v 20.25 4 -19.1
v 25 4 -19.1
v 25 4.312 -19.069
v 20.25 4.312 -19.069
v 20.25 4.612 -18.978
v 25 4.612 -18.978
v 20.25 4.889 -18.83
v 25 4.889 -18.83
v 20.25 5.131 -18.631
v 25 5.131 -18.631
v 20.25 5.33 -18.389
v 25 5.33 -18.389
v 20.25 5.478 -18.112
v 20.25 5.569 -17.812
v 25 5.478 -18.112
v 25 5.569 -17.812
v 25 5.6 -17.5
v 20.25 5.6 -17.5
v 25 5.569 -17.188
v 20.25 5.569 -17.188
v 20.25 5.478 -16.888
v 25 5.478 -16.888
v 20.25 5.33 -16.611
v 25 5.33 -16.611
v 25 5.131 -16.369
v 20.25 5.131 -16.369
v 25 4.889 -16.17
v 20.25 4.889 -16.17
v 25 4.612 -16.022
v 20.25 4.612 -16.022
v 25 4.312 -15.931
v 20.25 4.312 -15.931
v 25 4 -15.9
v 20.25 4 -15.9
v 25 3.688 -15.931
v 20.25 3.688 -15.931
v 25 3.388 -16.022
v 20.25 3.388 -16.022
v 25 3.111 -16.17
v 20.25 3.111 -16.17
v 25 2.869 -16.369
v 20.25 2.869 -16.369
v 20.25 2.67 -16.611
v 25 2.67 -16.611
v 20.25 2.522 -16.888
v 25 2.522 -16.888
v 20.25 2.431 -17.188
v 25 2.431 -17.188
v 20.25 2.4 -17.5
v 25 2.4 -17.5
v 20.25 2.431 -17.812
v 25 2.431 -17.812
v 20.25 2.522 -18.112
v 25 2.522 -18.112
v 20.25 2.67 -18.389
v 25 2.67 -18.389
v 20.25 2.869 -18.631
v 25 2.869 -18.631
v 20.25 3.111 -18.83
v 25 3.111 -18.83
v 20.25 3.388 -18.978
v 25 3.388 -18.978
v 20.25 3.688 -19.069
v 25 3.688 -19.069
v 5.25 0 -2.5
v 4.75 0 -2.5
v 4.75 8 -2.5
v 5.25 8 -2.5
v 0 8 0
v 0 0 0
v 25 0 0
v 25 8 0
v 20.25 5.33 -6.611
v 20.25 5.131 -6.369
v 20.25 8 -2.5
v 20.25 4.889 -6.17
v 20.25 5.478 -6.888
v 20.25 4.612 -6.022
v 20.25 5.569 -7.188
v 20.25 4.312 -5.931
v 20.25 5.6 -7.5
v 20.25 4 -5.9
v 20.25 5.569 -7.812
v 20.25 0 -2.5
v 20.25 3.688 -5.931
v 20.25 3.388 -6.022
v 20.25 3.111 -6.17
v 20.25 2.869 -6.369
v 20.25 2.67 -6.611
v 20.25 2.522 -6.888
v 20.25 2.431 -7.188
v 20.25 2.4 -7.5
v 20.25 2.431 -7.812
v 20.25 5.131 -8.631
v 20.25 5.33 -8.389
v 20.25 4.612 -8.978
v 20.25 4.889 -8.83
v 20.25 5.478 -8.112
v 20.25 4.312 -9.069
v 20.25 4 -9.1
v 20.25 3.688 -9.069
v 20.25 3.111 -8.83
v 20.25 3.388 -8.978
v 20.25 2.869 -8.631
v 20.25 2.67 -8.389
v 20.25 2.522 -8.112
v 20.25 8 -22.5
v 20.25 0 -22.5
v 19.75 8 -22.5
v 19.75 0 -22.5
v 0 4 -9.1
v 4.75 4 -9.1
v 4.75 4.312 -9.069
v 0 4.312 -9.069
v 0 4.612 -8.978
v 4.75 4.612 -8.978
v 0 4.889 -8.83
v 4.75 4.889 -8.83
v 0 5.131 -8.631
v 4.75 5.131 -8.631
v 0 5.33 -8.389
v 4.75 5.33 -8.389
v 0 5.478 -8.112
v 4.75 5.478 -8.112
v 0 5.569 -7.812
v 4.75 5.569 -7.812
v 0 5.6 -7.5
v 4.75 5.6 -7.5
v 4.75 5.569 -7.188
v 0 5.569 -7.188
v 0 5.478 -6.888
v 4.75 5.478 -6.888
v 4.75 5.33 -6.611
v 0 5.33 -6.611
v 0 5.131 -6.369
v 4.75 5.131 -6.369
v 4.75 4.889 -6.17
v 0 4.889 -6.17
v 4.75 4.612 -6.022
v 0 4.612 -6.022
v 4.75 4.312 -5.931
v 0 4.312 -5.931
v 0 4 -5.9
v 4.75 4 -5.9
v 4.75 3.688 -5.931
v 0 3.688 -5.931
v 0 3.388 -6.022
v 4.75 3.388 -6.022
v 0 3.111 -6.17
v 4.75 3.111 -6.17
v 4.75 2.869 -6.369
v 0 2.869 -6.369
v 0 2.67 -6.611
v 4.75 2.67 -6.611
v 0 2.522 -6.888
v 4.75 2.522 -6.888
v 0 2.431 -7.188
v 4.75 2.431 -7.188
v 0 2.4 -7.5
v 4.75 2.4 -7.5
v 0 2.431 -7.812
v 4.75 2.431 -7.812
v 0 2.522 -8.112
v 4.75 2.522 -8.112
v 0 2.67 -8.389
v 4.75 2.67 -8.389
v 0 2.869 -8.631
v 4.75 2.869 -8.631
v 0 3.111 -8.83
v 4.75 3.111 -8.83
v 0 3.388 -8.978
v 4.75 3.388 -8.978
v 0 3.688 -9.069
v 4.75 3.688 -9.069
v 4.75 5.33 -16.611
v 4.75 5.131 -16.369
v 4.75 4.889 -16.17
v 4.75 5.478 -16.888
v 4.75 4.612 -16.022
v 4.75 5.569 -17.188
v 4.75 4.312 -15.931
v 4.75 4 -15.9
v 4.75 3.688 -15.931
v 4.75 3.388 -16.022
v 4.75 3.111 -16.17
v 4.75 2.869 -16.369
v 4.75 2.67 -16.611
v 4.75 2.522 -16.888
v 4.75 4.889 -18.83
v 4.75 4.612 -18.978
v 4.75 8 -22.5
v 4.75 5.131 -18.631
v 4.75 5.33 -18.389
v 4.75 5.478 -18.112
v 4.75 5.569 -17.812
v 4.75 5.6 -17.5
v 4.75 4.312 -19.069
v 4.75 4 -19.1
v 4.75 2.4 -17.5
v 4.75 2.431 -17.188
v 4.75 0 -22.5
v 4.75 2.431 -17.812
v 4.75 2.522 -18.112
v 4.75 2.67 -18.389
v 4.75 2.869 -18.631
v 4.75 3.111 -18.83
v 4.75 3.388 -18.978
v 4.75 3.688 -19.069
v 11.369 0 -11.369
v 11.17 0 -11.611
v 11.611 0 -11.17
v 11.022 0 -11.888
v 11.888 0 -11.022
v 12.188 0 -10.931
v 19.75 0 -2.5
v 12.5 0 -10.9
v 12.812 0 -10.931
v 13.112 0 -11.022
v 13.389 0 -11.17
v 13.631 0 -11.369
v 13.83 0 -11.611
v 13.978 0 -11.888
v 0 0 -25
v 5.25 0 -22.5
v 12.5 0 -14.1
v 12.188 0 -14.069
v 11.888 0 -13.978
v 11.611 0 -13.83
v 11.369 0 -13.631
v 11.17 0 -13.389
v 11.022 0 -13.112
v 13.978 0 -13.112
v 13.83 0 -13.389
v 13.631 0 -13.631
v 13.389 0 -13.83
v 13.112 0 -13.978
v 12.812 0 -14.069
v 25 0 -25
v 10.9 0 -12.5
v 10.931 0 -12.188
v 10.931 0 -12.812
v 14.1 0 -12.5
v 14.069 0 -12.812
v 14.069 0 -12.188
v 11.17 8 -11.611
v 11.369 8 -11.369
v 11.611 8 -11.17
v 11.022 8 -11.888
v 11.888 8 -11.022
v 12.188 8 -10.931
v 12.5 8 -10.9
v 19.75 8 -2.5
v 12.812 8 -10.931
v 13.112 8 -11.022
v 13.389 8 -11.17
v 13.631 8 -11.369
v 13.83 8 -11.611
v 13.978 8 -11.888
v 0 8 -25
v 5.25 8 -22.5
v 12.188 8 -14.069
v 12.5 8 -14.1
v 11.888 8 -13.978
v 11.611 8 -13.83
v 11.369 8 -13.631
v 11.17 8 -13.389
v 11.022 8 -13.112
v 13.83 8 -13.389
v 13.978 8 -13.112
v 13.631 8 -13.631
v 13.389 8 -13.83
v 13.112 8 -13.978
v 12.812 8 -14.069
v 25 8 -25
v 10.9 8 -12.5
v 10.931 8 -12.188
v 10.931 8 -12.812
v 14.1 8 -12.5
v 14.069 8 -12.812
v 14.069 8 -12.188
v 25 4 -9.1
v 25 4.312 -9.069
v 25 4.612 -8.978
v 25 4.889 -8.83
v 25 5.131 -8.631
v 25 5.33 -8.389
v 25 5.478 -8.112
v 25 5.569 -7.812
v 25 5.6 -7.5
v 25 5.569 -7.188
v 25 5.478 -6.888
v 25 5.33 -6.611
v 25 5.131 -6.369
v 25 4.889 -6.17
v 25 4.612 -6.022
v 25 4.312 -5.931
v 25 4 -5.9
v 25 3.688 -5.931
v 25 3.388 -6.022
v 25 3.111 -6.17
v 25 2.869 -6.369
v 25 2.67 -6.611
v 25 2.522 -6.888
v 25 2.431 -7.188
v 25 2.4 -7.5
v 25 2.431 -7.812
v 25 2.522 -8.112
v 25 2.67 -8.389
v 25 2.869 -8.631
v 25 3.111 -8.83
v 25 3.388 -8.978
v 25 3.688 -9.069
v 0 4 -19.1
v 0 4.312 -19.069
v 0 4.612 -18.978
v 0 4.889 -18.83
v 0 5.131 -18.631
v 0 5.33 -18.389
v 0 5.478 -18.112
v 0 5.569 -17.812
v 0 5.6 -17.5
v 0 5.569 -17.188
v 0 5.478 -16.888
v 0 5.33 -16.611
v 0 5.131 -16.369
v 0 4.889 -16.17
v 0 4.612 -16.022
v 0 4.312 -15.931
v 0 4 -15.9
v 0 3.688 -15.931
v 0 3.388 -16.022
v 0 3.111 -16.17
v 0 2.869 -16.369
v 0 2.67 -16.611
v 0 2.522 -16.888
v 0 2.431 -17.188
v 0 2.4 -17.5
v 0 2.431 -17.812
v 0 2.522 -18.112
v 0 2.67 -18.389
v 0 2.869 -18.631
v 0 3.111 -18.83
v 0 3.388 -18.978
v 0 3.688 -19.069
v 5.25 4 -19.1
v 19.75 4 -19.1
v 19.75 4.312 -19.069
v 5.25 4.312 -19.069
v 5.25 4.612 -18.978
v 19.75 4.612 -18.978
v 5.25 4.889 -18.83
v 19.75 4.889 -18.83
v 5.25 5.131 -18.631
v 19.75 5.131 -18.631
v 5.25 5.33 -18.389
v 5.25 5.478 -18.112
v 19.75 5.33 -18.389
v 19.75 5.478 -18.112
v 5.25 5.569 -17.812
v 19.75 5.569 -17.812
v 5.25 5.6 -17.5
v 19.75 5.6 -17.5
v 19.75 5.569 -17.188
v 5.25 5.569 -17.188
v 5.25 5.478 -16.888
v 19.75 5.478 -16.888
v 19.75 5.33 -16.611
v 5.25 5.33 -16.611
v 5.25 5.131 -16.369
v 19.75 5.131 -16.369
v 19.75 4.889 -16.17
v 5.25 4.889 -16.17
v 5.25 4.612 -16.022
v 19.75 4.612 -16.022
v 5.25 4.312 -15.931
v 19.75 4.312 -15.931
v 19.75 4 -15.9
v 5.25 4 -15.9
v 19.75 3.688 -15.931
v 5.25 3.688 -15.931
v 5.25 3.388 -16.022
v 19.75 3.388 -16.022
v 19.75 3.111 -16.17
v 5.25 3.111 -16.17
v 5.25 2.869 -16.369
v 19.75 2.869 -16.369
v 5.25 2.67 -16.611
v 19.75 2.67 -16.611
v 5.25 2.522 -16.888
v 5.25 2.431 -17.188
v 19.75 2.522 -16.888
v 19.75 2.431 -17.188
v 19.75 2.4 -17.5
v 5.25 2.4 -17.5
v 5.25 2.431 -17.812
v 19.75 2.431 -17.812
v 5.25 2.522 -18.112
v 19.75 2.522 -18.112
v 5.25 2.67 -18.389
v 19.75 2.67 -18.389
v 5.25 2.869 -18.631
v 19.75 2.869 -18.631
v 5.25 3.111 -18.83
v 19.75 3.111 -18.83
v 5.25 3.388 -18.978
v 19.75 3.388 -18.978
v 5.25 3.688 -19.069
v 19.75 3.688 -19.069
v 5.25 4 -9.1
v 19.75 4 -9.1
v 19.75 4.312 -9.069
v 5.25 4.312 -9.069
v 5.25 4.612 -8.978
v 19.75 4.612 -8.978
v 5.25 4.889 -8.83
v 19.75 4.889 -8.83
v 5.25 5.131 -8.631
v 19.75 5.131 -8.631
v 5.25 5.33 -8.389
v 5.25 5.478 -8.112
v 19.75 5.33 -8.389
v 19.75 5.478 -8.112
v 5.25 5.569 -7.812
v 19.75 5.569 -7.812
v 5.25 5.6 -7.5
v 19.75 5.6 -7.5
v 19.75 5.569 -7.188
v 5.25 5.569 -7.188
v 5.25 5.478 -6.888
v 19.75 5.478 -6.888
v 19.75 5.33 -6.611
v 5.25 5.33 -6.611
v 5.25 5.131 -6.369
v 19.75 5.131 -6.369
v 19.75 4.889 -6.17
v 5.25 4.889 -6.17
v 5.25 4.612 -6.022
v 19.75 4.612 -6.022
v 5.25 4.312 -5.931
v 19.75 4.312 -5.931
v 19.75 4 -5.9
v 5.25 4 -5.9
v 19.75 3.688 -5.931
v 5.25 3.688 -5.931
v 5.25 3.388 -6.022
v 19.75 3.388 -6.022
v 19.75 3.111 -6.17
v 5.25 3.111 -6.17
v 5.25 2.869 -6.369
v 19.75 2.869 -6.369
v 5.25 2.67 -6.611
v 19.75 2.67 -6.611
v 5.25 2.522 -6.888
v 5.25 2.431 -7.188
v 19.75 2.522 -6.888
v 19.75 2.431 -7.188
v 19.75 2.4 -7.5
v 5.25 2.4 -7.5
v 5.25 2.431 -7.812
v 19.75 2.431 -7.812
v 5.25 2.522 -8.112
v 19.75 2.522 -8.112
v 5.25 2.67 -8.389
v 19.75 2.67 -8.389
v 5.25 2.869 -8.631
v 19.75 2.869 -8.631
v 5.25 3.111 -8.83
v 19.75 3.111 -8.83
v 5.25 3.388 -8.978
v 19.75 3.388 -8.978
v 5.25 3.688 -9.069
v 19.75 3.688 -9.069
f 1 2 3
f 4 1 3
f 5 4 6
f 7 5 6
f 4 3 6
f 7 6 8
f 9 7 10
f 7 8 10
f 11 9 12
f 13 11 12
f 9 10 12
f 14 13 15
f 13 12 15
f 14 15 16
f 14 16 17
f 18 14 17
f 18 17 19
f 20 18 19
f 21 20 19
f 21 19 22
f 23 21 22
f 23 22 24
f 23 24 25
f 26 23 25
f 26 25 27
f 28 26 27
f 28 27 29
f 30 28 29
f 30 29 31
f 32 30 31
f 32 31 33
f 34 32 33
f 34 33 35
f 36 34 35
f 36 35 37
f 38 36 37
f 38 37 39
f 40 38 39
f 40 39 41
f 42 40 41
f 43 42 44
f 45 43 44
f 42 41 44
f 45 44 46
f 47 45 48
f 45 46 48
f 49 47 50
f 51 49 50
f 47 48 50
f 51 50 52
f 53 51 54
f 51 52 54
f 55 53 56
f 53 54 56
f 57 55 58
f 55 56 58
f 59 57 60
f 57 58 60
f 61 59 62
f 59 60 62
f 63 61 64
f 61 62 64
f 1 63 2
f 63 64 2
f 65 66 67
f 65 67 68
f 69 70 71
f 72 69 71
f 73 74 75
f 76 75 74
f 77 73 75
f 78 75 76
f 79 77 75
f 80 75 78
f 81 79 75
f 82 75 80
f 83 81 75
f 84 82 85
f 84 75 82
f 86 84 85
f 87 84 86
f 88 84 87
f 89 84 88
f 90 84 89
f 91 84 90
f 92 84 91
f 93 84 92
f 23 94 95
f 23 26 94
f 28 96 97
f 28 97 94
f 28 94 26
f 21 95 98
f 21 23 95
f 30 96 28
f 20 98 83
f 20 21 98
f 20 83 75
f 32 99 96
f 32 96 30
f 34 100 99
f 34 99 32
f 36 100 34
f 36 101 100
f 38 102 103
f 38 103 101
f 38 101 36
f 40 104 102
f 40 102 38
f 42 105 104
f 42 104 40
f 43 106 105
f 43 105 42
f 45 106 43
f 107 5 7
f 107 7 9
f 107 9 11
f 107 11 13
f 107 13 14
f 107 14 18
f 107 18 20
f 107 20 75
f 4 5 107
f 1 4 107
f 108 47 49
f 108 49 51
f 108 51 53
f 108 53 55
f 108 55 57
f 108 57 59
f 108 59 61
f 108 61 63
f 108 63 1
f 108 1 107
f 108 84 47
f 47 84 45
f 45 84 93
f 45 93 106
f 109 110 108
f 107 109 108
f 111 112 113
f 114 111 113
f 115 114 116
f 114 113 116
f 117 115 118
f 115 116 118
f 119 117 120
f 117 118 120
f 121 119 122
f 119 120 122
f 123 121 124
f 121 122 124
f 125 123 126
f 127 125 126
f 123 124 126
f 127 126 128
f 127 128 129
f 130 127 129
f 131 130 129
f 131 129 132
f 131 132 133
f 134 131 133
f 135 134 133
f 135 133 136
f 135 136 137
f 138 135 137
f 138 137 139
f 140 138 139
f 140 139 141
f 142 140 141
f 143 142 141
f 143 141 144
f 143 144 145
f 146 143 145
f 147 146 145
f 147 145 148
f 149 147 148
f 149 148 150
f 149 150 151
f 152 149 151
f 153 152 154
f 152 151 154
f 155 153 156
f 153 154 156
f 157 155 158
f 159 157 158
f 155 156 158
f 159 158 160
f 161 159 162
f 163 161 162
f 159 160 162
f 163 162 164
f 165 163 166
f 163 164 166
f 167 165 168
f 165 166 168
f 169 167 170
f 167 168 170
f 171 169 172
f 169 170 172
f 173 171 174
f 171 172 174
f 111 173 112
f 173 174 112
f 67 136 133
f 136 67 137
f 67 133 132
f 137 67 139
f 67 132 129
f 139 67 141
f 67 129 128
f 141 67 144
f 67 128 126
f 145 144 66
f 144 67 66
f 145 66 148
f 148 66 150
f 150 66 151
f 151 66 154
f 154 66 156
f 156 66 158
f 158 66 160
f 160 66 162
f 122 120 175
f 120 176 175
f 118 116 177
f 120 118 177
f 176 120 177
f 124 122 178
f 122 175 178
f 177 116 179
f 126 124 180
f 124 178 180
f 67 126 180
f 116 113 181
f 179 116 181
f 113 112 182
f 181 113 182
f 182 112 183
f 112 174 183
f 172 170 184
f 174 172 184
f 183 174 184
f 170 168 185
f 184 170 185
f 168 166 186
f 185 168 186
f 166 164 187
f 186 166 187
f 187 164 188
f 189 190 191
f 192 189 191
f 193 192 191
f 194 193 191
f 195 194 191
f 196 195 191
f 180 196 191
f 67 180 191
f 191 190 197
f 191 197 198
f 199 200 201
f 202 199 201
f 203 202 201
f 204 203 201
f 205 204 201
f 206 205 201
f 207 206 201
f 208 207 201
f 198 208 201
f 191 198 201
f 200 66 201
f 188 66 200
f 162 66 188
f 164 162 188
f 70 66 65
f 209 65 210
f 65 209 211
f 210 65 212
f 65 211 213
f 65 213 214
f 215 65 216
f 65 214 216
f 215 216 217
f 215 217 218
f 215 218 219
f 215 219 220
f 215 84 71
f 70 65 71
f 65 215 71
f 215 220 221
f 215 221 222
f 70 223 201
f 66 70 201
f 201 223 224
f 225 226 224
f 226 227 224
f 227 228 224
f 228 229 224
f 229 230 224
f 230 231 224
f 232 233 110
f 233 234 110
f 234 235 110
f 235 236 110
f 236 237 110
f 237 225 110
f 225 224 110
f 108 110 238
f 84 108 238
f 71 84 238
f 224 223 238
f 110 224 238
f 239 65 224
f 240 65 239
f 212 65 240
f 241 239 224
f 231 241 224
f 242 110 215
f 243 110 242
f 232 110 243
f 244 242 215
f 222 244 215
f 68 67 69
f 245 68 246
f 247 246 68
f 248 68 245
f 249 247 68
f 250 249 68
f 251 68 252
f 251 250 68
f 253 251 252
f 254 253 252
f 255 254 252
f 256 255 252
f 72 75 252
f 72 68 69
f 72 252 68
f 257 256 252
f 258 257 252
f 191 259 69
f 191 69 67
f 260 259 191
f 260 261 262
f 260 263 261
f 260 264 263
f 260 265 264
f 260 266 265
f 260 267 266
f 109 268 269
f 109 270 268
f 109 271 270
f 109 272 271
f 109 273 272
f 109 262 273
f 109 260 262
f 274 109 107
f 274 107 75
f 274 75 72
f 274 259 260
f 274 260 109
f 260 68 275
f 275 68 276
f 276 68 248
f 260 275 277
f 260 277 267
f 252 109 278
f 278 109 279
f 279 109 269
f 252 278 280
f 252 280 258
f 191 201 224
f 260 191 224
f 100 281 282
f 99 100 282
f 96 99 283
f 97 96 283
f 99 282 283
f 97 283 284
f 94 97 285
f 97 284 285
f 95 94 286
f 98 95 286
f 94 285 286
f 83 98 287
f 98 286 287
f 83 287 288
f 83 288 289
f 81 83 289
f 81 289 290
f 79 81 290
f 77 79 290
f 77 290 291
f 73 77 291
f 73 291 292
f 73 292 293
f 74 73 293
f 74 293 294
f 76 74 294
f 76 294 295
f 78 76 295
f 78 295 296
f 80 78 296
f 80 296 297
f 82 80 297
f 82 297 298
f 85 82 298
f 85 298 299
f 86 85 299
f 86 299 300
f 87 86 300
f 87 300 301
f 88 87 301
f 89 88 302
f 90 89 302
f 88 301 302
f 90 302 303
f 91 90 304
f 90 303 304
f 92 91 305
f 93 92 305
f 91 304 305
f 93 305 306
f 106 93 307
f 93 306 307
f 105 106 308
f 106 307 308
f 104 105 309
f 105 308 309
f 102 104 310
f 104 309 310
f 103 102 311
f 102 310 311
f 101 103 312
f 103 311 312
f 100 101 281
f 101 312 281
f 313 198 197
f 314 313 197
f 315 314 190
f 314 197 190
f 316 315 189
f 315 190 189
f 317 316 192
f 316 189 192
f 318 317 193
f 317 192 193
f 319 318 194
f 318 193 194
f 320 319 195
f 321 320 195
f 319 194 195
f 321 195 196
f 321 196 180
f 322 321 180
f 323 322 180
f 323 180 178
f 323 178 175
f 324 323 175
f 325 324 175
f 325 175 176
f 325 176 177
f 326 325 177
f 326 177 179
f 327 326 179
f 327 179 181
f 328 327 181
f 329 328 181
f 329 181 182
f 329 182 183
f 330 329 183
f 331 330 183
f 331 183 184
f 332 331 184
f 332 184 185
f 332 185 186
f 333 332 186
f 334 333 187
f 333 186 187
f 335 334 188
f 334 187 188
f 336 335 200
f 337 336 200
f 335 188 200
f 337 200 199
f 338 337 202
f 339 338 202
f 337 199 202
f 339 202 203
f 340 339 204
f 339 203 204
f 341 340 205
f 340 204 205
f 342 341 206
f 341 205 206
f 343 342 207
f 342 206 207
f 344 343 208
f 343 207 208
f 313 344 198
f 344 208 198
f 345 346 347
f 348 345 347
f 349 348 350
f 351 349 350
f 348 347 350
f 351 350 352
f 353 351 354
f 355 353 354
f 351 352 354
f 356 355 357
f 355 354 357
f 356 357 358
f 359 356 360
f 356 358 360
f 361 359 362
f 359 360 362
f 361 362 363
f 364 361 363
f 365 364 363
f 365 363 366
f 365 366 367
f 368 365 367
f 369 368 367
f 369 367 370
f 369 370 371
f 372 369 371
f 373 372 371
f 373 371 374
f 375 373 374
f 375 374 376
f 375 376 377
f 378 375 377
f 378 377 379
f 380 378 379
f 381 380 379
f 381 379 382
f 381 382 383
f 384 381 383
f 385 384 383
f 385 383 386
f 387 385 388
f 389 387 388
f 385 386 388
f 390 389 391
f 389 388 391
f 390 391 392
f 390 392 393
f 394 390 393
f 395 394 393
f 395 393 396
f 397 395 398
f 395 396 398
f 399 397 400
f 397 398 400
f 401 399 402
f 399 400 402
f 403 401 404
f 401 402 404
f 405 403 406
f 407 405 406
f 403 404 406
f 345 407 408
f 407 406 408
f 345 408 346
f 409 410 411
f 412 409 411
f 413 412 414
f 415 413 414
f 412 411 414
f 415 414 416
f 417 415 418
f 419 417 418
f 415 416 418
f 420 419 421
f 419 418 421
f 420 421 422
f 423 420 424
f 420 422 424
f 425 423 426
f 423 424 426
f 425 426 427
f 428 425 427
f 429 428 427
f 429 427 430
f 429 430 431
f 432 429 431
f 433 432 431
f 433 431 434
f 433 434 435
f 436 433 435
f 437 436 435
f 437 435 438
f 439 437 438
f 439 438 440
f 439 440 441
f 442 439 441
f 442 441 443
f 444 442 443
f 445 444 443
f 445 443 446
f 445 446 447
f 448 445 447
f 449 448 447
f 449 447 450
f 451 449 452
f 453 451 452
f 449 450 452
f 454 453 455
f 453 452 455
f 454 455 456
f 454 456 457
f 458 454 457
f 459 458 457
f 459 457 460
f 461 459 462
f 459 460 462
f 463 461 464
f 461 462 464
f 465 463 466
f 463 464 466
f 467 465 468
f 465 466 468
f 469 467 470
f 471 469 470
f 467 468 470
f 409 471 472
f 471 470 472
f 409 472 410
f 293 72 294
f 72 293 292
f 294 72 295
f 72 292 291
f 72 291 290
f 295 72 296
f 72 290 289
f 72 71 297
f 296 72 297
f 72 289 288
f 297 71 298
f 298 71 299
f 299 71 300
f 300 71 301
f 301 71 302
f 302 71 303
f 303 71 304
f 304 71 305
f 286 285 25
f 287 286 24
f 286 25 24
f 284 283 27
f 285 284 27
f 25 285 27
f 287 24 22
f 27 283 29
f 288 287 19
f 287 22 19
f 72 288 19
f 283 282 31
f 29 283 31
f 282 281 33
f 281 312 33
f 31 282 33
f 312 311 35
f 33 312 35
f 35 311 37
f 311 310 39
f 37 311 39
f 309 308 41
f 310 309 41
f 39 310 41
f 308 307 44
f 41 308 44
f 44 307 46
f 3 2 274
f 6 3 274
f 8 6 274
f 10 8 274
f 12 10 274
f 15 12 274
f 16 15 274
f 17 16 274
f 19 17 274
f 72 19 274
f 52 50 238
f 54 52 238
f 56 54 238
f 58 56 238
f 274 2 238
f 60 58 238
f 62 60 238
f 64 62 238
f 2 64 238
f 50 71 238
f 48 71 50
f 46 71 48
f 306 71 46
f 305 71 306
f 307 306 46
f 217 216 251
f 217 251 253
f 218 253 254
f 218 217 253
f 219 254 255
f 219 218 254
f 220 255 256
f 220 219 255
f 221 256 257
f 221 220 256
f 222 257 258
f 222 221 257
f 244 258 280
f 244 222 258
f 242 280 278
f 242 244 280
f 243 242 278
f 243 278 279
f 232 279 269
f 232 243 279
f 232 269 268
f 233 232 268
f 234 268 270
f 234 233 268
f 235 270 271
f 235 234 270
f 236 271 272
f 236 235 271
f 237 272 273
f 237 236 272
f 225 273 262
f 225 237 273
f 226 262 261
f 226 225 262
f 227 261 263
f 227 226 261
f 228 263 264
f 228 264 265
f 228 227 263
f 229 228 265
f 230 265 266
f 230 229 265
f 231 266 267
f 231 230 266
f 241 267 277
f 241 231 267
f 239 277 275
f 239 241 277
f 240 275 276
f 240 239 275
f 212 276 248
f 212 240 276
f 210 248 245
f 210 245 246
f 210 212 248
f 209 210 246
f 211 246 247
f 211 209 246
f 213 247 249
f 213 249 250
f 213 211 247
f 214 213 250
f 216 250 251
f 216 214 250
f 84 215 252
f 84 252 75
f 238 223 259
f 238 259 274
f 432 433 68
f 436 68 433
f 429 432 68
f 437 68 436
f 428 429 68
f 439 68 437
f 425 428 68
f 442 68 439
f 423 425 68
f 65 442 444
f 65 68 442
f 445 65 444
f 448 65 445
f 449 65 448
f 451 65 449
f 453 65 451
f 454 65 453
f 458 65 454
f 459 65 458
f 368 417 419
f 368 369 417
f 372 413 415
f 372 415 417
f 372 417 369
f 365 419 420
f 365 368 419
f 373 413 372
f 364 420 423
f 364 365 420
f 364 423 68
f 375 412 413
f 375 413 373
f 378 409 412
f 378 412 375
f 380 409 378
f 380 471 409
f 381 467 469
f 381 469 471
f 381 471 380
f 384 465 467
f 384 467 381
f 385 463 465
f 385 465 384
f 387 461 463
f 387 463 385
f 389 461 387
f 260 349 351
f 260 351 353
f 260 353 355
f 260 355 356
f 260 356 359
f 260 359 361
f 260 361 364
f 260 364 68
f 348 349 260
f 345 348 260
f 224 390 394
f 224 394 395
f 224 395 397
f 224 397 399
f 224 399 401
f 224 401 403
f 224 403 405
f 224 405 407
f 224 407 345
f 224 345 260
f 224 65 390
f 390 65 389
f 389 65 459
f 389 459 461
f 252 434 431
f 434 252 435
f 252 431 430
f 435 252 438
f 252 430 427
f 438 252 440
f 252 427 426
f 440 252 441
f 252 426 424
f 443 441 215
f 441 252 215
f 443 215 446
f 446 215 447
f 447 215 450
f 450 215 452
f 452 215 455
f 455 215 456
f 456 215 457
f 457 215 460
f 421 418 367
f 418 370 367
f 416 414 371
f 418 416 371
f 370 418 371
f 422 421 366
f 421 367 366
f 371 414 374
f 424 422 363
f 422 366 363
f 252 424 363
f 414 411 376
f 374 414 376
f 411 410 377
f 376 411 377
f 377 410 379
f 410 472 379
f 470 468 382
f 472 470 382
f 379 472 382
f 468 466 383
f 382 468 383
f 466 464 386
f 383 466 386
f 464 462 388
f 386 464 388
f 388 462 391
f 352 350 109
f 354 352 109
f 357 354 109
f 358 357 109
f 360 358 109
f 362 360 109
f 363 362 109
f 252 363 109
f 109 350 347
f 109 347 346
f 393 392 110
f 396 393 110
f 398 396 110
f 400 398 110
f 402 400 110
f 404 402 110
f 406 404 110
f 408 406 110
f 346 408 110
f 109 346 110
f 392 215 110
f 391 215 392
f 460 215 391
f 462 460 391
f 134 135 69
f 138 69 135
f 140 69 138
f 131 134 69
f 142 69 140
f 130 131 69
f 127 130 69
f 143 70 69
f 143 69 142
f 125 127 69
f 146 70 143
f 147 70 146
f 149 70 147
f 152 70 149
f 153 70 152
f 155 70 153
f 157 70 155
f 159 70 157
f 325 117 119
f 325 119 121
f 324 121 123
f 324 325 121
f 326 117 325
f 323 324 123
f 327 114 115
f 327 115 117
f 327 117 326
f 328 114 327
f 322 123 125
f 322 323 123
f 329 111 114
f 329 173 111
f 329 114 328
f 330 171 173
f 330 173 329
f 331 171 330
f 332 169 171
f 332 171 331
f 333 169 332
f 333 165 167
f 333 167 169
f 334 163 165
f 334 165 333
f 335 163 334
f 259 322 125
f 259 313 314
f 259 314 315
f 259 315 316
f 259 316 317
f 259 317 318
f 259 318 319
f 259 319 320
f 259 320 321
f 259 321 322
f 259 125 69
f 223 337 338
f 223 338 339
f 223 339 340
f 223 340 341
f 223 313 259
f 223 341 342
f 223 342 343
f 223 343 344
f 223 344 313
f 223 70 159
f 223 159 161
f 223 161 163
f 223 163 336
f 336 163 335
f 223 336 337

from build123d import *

# Parameters (mm, degrees)
SKETCH2_W           = 25
SKETCH2_H           = 25
SKETCH2_R           = 1.6
SKETCH2_W_2         = 0.5
SKETCH2_H_2         = 20
BOSS_EXTRUDE1_DEPTH = 8
SKETCH3_R           = 1.6
CUT_EXTRUDE1_DEPTH  = 37.249137921


with BuildPart() as part:
    # Sketch2 → Boss-Extrude1 (new body)
    with BuildSketch(Plane(origin=(0, 0, 0), x_dir=(1, 0, 0), z_dir=(0, 1, 0))):
        with Locations((12.5, 12.5)):
            Rectangle(SKETCH2_W, SKETCH2_H)
        with Locations(Location((12.5, 12.5, 0), (0, 0, 270))):
            Circle(SKETCH2_R, mode=Mode.SUBTRACT)
        with Locations((5, 12.5)):
            Rectangle(SKETCH2_W_2, SKETCH2_H_2, mode=Mode.SUBTRACT)
        with Locations((20, 12.5)):
            Rectangle(SKETCH2_W_2, SKETCH2_H_2, mode=Mode.SUBTRACT)
    extrude(amount=BOSS_EXTRUDE1_DEPTH)

    # Sketch3 → Cut-Extrude1 (cut, through all)
    with BuildSketch(Plane(origin=(25, 0, 0), x_dir=(0, 0, -1), z_dir=(1, 0, 0))):
        with Locations((7.5, 4)):
            Circle(SKETCH3_R)
        with Locations((17.5, 4)):
            Circle(SKETCH3_R)
    extrude(amount=-CUT_EXTRUDE1_DEPTH, mode=Mode.SUBTRACT)


solid = part.part
